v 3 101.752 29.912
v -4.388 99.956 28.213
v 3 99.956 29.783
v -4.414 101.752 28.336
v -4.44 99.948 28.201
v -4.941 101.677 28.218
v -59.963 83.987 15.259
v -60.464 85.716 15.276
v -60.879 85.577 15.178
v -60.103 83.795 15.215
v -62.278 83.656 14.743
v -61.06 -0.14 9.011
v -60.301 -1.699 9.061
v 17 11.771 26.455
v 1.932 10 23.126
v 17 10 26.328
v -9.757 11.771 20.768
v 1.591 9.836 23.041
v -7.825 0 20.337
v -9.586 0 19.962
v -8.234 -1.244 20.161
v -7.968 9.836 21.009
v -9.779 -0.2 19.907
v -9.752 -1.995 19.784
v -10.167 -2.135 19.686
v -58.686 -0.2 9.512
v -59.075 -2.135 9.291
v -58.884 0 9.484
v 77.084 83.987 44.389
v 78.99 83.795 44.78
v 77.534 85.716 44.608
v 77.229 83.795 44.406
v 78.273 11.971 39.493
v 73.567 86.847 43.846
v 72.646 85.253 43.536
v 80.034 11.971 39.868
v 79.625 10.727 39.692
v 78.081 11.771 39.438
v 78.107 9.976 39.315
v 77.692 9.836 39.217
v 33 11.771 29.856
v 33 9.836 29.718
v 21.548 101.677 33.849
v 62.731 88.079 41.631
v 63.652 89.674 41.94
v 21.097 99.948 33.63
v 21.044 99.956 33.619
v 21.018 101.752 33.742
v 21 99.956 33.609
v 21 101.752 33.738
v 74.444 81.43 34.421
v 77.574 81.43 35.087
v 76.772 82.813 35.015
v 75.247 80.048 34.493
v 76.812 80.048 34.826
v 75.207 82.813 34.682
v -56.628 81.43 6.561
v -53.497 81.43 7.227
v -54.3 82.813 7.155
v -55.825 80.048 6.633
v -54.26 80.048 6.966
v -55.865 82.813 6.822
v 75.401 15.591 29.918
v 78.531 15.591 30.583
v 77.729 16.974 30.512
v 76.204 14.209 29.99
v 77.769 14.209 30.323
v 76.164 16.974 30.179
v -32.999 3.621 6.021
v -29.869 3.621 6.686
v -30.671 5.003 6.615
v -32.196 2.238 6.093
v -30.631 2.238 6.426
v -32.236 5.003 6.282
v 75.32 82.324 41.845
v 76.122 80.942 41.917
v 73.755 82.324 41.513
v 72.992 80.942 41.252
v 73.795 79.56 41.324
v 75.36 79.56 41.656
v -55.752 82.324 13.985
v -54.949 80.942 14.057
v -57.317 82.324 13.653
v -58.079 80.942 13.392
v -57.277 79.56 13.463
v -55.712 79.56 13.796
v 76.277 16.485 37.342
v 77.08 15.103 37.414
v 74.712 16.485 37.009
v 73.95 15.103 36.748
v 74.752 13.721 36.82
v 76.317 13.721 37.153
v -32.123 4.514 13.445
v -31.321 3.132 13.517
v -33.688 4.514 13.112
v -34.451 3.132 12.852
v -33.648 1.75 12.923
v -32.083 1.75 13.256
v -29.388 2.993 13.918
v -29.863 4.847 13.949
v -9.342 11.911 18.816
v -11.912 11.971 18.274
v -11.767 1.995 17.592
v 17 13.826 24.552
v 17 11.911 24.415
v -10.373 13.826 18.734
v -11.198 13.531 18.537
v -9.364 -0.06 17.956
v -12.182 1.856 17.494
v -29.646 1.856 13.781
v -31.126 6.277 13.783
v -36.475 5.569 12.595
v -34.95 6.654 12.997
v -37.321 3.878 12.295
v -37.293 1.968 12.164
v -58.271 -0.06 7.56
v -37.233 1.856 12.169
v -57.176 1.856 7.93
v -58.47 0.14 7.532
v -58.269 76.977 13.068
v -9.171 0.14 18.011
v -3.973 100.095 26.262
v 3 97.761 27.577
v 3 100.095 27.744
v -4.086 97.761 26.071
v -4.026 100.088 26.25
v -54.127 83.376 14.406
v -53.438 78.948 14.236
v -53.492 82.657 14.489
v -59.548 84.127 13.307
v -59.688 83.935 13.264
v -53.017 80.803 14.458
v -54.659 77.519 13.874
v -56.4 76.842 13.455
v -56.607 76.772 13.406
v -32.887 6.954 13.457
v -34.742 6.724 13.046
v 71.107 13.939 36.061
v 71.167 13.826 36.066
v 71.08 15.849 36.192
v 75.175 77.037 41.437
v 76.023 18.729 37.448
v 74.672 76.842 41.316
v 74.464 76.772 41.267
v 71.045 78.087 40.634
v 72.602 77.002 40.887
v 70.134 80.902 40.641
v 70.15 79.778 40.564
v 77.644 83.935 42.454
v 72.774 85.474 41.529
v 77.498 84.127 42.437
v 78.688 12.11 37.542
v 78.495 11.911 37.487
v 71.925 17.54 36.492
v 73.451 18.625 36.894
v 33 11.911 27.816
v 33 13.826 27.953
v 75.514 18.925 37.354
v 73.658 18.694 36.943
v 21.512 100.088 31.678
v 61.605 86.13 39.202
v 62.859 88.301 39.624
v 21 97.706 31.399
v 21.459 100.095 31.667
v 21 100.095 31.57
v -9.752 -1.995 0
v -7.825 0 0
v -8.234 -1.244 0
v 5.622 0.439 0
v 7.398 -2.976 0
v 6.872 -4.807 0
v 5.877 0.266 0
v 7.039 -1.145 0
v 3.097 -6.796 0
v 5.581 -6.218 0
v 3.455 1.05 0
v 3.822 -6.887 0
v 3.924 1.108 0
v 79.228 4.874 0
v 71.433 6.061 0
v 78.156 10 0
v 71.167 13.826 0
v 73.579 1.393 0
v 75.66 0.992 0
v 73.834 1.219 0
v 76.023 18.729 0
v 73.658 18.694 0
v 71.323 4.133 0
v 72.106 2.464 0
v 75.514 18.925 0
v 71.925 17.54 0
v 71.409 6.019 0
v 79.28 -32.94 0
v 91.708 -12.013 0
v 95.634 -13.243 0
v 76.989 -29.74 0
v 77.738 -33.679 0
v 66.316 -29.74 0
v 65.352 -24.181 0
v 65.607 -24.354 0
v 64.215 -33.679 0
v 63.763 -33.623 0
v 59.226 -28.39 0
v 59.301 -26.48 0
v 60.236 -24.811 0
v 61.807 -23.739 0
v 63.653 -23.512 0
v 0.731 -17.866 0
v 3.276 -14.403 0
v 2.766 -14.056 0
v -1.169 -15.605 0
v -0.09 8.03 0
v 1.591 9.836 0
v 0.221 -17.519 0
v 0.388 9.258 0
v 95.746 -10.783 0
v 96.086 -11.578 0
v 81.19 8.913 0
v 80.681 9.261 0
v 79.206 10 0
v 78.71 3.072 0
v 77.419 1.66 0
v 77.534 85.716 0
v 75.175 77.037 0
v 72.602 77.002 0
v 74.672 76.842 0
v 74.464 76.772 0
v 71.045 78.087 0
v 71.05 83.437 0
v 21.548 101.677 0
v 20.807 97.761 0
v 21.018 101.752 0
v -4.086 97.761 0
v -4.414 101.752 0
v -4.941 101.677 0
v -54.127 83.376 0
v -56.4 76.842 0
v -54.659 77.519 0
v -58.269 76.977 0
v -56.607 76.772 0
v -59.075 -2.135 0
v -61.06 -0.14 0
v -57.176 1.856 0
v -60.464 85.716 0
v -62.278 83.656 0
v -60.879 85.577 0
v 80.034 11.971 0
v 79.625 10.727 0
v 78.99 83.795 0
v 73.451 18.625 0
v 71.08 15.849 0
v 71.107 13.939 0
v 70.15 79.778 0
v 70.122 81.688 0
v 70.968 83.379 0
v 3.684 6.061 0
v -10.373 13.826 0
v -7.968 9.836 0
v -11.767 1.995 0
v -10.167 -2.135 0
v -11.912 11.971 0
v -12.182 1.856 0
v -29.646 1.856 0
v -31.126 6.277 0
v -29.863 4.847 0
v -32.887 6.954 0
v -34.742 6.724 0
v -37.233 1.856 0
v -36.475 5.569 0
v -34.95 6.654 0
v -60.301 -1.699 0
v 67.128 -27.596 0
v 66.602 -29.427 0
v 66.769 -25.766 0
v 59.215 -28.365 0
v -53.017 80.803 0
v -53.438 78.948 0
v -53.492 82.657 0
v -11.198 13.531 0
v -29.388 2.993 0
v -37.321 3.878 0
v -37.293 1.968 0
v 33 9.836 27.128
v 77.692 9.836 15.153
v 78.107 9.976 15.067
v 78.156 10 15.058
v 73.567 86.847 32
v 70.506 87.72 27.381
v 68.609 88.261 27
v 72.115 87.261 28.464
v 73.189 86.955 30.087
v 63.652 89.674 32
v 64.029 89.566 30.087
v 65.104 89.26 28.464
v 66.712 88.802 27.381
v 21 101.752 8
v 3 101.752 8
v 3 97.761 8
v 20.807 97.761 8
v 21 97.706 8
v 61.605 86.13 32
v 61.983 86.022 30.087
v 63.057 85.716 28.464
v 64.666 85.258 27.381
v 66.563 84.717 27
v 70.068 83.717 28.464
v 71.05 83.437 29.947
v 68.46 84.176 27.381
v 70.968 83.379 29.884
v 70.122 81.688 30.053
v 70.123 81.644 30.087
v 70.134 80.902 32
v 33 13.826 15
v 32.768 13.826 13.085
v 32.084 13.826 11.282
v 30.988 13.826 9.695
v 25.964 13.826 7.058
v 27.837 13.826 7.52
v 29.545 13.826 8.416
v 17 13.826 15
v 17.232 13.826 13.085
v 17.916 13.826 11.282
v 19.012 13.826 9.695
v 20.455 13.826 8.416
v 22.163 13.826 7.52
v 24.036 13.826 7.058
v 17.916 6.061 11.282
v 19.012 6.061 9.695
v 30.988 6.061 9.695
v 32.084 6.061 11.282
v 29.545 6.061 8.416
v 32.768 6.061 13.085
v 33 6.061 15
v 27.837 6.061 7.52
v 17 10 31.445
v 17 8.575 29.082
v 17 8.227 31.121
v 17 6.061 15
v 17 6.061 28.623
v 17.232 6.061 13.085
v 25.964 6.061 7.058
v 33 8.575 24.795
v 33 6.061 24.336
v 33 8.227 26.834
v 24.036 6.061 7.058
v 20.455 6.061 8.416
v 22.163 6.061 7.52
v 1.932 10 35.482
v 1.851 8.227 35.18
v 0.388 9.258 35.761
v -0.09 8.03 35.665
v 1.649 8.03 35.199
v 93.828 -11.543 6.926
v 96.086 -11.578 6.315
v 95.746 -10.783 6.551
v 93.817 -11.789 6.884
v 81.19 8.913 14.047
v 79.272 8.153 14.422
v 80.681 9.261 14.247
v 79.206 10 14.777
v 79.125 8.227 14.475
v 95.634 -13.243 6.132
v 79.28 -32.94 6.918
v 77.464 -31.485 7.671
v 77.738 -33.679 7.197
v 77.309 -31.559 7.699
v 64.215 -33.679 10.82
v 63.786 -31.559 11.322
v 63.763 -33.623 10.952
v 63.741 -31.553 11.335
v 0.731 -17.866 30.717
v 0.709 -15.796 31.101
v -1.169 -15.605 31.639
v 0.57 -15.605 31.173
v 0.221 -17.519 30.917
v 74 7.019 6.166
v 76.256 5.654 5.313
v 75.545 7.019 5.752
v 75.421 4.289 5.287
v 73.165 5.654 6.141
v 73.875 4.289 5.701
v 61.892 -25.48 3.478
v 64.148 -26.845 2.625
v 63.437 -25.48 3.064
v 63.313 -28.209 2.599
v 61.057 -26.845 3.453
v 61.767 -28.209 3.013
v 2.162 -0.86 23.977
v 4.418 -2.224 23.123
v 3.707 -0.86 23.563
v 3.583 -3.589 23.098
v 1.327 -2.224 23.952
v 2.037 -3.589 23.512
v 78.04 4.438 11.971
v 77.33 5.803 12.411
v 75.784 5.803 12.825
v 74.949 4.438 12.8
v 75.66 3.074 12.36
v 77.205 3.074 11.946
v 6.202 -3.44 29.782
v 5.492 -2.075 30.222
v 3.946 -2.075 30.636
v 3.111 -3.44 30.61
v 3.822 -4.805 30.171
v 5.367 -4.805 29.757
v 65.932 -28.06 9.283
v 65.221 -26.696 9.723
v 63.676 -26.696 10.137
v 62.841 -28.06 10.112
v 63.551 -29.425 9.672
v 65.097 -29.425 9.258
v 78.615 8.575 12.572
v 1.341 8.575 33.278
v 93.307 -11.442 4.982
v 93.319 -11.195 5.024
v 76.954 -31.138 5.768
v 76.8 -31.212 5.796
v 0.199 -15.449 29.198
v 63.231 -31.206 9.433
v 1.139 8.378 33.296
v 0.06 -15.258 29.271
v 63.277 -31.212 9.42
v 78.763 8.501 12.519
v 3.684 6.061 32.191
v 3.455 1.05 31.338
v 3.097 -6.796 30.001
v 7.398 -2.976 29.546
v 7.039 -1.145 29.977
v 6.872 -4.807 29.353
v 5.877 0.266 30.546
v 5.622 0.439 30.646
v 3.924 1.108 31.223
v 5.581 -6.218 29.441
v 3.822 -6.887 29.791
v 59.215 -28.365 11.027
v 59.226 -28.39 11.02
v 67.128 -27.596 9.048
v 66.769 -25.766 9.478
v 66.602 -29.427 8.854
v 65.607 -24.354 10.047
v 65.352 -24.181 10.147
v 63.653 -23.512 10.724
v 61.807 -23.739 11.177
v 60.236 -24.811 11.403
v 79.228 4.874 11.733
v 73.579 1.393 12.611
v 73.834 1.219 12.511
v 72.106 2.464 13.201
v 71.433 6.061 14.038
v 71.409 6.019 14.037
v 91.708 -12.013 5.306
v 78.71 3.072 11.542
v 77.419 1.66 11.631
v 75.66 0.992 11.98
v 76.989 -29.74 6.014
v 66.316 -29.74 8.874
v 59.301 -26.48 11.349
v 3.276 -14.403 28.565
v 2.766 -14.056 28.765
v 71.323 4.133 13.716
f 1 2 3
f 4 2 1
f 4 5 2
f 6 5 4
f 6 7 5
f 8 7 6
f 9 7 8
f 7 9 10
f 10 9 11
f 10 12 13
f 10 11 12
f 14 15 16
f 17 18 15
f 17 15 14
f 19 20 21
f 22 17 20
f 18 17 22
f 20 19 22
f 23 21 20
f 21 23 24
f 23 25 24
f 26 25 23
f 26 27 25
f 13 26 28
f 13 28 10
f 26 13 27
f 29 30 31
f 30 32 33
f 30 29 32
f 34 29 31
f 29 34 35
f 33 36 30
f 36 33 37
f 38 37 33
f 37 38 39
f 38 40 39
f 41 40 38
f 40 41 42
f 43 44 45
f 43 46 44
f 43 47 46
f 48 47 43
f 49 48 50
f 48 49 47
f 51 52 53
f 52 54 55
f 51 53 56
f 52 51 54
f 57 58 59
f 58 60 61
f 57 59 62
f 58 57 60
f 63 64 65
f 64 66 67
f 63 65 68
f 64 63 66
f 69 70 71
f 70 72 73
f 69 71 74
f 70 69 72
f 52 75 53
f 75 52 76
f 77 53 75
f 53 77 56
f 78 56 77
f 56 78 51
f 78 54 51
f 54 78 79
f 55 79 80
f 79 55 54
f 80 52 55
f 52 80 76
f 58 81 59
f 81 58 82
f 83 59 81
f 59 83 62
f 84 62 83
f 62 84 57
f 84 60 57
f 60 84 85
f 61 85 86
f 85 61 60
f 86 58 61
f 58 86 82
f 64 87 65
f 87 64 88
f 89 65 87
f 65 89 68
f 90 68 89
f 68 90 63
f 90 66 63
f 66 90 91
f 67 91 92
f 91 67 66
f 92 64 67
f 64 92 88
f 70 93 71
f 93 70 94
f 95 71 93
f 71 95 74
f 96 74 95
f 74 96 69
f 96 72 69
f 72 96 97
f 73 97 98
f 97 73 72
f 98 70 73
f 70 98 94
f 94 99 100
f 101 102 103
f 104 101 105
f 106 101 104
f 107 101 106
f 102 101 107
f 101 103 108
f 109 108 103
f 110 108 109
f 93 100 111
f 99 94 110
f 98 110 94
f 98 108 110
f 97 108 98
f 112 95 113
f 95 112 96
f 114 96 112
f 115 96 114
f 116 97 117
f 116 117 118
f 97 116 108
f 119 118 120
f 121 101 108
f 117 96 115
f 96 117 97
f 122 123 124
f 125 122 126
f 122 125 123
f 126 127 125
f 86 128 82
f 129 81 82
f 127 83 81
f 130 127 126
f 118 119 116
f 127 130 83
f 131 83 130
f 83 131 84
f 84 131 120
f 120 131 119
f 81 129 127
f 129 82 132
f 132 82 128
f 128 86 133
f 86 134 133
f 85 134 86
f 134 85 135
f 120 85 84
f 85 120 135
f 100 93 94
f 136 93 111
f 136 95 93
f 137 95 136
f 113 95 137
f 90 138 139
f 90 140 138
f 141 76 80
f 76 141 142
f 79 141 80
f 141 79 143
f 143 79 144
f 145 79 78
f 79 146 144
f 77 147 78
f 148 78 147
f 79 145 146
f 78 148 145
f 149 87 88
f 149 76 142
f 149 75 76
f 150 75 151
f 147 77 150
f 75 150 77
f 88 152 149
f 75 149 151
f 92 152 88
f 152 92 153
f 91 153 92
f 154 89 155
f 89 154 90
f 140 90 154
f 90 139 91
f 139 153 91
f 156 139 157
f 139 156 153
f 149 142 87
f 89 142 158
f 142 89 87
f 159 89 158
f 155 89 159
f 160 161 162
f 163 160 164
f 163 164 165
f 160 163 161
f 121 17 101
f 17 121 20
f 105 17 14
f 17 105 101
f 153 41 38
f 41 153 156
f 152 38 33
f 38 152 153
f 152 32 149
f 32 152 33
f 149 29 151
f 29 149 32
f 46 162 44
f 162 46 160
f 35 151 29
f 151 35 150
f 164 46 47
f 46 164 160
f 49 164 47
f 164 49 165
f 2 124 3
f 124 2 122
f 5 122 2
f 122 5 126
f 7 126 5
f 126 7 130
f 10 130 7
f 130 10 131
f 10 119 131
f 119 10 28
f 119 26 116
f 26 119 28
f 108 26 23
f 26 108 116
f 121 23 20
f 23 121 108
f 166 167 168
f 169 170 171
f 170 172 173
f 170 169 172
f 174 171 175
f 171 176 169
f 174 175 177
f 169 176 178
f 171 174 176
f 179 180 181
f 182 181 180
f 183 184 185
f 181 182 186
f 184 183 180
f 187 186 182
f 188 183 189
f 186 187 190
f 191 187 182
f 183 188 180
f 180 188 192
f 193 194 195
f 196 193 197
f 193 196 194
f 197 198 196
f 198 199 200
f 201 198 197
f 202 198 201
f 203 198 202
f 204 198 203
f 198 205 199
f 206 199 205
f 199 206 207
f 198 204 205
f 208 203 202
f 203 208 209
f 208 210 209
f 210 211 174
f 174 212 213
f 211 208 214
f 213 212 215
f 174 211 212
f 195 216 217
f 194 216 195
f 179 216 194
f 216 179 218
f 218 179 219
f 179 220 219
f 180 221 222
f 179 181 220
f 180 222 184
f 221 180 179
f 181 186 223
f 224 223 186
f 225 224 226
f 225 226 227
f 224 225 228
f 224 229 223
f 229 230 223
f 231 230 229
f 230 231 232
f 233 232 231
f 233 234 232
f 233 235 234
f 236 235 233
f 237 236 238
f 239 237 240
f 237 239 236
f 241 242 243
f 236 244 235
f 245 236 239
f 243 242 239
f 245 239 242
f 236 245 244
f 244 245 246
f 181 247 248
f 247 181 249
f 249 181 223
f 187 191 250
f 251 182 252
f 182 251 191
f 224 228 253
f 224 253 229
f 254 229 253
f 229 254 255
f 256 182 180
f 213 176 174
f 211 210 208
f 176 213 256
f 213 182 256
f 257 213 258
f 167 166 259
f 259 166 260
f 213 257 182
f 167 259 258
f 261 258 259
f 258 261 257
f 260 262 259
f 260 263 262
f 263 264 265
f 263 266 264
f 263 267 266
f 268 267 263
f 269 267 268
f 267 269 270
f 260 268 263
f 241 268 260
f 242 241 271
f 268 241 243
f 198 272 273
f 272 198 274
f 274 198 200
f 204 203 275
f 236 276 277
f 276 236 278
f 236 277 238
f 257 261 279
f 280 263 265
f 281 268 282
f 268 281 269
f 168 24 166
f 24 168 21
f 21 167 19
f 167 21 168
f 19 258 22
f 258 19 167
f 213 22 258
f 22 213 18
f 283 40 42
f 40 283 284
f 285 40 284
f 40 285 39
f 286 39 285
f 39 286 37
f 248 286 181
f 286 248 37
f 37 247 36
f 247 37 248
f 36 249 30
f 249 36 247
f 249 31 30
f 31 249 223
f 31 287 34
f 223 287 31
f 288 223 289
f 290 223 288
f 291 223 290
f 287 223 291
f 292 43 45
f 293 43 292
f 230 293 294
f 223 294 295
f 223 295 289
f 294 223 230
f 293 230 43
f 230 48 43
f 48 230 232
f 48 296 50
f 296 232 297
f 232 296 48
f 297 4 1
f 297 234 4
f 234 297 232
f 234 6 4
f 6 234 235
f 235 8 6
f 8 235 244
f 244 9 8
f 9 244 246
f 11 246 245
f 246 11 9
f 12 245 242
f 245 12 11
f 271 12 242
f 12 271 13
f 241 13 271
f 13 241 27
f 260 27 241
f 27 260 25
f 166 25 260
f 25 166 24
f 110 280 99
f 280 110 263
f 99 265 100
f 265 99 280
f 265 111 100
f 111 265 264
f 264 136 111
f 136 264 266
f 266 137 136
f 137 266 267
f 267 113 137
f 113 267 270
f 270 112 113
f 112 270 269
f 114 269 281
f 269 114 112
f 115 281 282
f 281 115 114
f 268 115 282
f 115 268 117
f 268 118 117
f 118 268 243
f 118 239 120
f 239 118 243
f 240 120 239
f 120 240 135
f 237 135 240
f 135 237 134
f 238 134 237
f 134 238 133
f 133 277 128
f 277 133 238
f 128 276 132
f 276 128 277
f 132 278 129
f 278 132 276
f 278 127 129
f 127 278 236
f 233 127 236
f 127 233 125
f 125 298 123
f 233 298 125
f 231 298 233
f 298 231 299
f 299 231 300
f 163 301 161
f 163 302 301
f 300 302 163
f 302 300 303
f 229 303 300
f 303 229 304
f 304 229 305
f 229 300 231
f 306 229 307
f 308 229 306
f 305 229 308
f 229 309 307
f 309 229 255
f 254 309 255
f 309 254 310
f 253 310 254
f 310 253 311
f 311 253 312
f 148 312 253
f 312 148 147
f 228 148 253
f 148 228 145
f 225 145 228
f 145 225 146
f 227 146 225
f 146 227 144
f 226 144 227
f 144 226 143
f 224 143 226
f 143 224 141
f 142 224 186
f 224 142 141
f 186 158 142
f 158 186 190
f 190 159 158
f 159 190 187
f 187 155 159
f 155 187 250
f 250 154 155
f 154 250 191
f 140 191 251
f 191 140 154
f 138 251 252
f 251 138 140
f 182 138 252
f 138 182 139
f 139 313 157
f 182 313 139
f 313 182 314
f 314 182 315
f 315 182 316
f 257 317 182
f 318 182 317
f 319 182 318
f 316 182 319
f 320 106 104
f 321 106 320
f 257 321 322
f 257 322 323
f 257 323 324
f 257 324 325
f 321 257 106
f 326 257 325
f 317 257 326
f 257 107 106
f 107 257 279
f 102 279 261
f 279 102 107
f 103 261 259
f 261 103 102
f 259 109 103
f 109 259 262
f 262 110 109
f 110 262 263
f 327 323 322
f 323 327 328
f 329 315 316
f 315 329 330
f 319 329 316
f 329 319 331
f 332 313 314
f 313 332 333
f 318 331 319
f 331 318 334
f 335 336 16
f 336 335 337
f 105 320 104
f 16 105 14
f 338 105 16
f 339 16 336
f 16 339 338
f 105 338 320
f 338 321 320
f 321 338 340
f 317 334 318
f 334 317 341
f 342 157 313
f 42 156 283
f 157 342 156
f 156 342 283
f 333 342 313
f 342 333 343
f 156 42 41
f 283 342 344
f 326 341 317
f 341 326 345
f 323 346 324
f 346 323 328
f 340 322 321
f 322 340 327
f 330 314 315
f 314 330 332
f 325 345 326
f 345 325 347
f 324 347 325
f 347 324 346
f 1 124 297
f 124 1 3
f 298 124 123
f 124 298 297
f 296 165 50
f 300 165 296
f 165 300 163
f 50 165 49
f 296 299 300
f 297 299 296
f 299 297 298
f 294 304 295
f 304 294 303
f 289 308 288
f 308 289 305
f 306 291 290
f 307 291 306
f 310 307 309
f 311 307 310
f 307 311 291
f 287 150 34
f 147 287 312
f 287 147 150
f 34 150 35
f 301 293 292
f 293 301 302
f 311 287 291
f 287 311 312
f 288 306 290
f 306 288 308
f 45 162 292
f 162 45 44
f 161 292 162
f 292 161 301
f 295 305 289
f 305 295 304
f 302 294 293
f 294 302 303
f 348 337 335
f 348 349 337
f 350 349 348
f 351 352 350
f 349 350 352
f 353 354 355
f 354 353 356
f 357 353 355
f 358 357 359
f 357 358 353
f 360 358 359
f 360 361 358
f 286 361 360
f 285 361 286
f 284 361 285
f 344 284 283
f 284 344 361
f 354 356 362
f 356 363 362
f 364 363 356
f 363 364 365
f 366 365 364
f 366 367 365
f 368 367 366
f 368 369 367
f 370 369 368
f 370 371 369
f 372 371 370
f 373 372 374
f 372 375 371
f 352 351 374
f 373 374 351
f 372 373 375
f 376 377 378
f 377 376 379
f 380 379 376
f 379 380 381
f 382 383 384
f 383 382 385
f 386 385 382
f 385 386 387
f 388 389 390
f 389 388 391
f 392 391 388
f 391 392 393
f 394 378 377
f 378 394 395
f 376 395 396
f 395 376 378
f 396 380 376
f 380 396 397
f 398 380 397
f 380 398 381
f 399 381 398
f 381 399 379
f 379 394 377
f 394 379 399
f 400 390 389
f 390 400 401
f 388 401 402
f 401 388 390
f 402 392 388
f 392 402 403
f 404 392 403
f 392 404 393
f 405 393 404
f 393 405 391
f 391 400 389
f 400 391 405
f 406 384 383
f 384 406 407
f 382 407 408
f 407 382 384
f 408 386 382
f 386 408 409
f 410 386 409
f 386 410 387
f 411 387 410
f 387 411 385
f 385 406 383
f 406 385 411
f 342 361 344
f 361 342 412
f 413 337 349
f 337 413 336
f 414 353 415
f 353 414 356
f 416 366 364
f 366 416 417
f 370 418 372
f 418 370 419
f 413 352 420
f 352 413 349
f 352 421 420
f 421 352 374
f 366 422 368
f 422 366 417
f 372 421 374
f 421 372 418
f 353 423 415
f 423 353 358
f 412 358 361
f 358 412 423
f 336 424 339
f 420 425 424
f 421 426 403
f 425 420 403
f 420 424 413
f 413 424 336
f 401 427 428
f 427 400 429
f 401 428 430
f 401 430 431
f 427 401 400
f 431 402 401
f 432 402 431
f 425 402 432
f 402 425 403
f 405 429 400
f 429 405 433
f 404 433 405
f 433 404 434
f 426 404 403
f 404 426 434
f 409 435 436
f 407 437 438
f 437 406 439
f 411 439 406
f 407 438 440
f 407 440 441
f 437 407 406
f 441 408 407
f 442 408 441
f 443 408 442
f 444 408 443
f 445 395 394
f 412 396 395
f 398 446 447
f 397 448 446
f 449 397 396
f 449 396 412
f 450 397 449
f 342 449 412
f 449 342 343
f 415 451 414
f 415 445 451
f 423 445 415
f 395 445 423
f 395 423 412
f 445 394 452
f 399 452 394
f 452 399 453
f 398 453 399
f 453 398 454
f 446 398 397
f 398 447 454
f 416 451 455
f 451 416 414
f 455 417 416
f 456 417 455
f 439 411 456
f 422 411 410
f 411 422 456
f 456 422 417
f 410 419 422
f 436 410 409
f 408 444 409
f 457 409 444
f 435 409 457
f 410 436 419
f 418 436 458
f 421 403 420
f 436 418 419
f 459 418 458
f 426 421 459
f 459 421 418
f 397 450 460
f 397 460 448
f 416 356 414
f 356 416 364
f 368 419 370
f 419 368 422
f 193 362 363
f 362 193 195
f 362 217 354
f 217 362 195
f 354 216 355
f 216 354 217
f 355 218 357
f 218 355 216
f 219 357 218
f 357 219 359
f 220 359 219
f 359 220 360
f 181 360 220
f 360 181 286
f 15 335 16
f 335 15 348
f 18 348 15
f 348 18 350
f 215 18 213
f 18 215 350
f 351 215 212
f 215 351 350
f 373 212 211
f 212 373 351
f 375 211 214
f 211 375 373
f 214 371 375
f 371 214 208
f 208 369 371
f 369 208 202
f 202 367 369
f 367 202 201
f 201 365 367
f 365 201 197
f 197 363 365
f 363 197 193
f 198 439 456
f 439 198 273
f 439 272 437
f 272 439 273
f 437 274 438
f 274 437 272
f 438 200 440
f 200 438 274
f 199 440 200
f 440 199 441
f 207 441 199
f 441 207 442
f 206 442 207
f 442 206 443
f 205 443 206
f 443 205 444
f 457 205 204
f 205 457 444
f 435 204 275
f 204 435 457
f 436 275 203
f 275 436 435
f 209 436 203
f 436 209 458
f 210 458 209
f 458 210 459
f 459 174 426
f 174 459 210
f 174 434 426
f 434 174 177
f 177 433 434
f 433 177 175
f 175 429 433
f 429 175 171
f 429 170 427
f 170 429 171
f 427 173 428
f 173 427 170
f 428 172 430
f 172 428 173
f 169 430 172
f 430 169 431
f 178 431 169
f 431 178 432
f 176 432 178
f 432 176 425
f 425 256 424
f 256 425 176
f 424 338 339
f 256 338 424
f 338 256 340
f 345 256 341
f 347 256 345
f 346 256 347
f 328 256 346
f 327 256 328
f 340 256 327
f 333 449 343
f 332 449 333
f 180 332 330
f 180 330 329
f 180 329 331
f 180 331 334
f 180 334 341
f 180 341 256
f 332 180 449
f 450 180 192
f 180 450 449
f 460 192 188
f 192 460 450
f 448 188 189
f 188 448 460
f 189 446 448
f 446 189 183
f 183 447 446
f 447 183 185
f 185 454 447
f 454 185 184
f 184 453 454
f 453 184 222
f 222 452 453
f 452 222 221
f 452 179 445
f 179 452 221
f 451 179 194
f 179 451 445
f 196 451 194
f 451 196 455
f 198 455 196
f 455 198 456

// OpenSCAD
// file: common.scad
cls = 0.20;

module keyswitch_hole(x=0, y=0, a=0) {
    translate([x, y, 0]) {
        rotate([0, 0, 90+a]) {
            linear_extrude(height = 2) {
            square([14+cls, 14+cls], center = true);
            }
            linear_extrude(height = 0.6) {
                translate([-3, 7]) square([6, 1]);
            translate([-3, -8]) square([6, 1]);
            }
        }
    }
}

keyswitch_hole();

module joint_male_face() {
    translate([-1, 0])
    square([2,4]);
    translate([-3, 2])
    square([6,2]);
}

module joint_male(pos=[0,0]) {
    translate(pos){
      rotate([0,0,180]){
        linear_extrude(height=10)
        joint_male_face();
        
        translate([0,2,10])
        rotate([-90,0,0])
        linear_extrude(height=2)
        circle(3, $fn=12);
        
        translate([0,0,10])
        rotate([-90,0,0])
        linear_extrude(height=2)
        circle(1, $fn=12);
      }
    }
}

module joint_female(pos=[0,0]) {
    delta = 0.6;
    translate(pos){
      rotate([0,0,180]){
        linear_extrude(height=10)
        offset(delta=delta)
        joint_male_face();
        
        translate([0,1.6,10])
        rotate([-90,0,0])
        linear_extrude(height=2.8)
        offset(delta=delta)
        circle(3, $fn=12);

        translate([0,-0.4,10])
        rotate([-90,0,0])
        linear_extrude(height=2.8)
        offset(delta=delta)
        circle(1, $fn=12);
      }
    }
}


joint_male([20, 0]);
joint_female([30, 0]);
// file: thumb.scad
use <common.scad>;

thumb_plate_points = [
                [2,  -26],
                [2,  -2],
                [82, -2],
                [98,-22],
                [82, -42],
                [68, -42],
                ];

thumb_plate_sc_points = [
                [2+4, -14],
                [82-2, -2-4],
                [71-2, -42+3],
                ];

module plate_nohole() {
    linear_extrude(height=2)
    polygon(points=thumb_plate_points);
}

module keyswitch_col(x=0,y=0,c=3,a=0) {
    translate([x,y])
    rotate([0,0,a])
    for (i = [0:c-1]) {
        keyswitch_hole(0, 19*i);
    }
}

module plate_holes() {
    keyswitch_hole(20, -14-3, 90);
    keyswitch_hole(39, -14, 90);
    keyswitch_hole(60, -16, 90-20);
    keyswitch_hole(78, -27, 90-40);

    for(p=thumb_plate_sc_points) {
        linear_extrude(height=5)
            translate(p)
            circle(1.6);
    }
}


module thumb_plate() {
    difference() {
        plate_nohole();
        plate_holes();
    }
}


tilt_angle = [10,15,0];
tilt_angle_r = tilt_angle * -1;
height = 36;

module thumb_case_outer_face() {
    projection()
        translate([0,0,height])
        rotate(tilt_angle)
        linear_extrude(height=2)
        offset(2)
        polygon(points=thumb_plate_points);
}

module thumb_case_inner_face() {
    projection()
        translate([0,0,height])
        rotate(tilt_angle)
        linear_extrude(height=2)
        offset(-2)
        polygon(points=thumb_plate_points);
}

module thumb_case_bottom_face() {
    difference(){
        thumb_case_outer_face();
        thumb_case_inner_face();
    }
    projection()
    translate([0,0,height])
    rotate(tilt_angle)
    for(p=thumb_plate_sc_points){
        linear_extrude(height=1)
        translate([-2,1])
        translate(p)
        circle(4);
    }
}

module case() {
    difference() {
        linear_extrude(height=50)
            thumb_case_bottom_face();
        translate([0,0,height])
            rotate(tilt_angle){
            linear_extrude(height=50)
                square(300, center=true);
            // screw hole
            translate([0,0,-9])
                linear_extrude(height=9)
                for(p=thumb_plate_sc_points){
                    translate(p)
                        circle(1.6);
                }
            // plate hole
            translate([0,0,-2])
            linear_extrude(height=2)
            offset(0.2)
            polygon(points=thumb_plate_points);
        }
    }
}

module thumb_case_hole(joint=true) {
    // cable hole
    translate([25,0,0])
    rotate([90,0,0])
    linear_extrude(height=4){
        translate([0, 15])
        circle(8);
        translate([-8,15])
        square([16, 30]);
    }
    if (joint) {
        for (x = [10,60]) {
            joint_female([x, 0]);
        }
    }
}

module thumb_case(joint=true) {
    difference() {
        case();
        thumb_case_hole(joint=joint);
    }
}

thumb_case();

translate([0, 60])
thumb_plate();
// file: main.scad
use <common.scad>;

UNIT = 19;
UNIT_H = UNIT / 2;
UNIT_Q = UNIT / 4;
UNIT_E = UNIT / 8;

KEY_OFFSET_X = 10;
KEY_OFFSET_Y = 8;

finger_plate_points = [
    [-60,0],
    [-10,0],
    [-10,12],
    [80, 12],
    [80, 84],
    [23, 100],
    [-3, 100],
    [-60, 84],
];

finger_plate_sc_points = [
    [-34, 3],
    [80-3, 12+3],
    [80-3, 84 - 3],
    [-60+3, 84 - 3],
];

module finger_plate_nohole() {
    linear_extrude(height = 2)
    polygon(points=finger_plate_points);
}

module keyswitch_col(x=0,y=0,c=3,a=0) {
    rotate([0, 0, a])
    for (i = [0:c-1]) {
        keyswitch_hole(x, y+19*i);
    }
}

module finger_plate_holes() {
    // G
    GX = KEY_OFFSET_X - UNIT * 3;
    GY = KEY_OFFSET_Y + UNIT_Q;
    echo("G: ", GX, GY);
    keyswitch_col(GX, GY, 4);
    // F
    FX = KEY_OFFSET_X- UNIT * 2;
    FY = KEY_OFFSET_Y + UNIT_H;
    echo("F: ", FX, FY);
    keyswitch_col(FX, FY, 4);
    // E
    EX = KEY_OFFSET_X - UNIT;
    EY = KEY_OFFSET_Y + UNIT_H + UNIT_Q + UNIT_Q;
    echo("E: ", EX, EY);
    keyswitch_col(EX, EY, 4);
    // D
    DX = KEY_OFFSET_X;
    DY = KEY_OFFSET_Y + UNIT + UNIT_Q;
    echo("D: ", DX, DY);
    keyswitch_col(DX, DY, 4);
    // C
    CX = KEY_OFFSET_X+ UNIT;
    CY = KEY_OFFSET_Y + UNIT;
    echo("C: ", CX, CY);
    keyswitch_col(CX, CY, 4);
    // B
    BX = KEY_OFFSET_X+UNIT * 2;
    BY = KEY_OFFSET_Y+ UNIT_H + UNIT_Q;
    echo("B: ", BX, BY);
    keyswitch_col(BX, BY, 4);
    // A
    AX = KEY_OFFSET_X+UNIT*3;
    AY = KEY_OFFSET_Y+UNIT + UNIT_Q;
    echo("A: ", AX, AY);
    keyswitch_col(AX, AY, 1);
    // next plan?
    //keyswitch_col(AX, AY, 2);
    echo("A2: ", AX, AY + UNIT + UNIT_Q);
    keyswitch_col(AX, AY + UNIT + UNIT_Q, 1);
    for(p=finger_plate_sc_points){
        linear_extrude(height=5)
            translate(p)
            circle(1.6);
    }
}

module finger_plate() {
    difference() {
        finger_plate_nohole();
        finger_plate_holes();
    }
}

tilt_angle = [4,-12,0];
tilt_angle_r = tilt_angle * -1;
echo(tilt_angle_r);

//height = 15;
height = 22;

module finger_case_outer_face() {
    projection()
        translate([0,0,height])
        rotate(tilt_angle)
        linear_extrude(height=2)
        offset(2)
        polygon(points=finger_plate_points);
}

module finger_case_inner_face() {
    projection()
        translate([0,0,height])
        rotate(tilt_angle)
        linear_extrude(height=2)
        offset(-2)
        polygon(points=finger_plate_points);
}

module finger_case_bottom_face() {
    difference() {
        finger_case_outer_face();
        finger_case_inner_face();
    }
    projection()
    translate([0,0,height])
    rotate(tilt_angle)
    for(p=finger_plate_sc_points){
        linear_extrude(height=1)
        translate(p)
        circle(4);
    }
}


module finger_case_nohole() {
    difference() {
        linear_extrude(height=50)
        finger_case_bottom_face();
    
        translate([0,0,height])
        rotate(tilt_angle){
            linear_extrude(height=50)
            square(300, center=true);
            // sc hole
            translate([0,0,-9])
            linear_extrude(height=9)
            for(p=finger_plate_sc_points){
                translate(p)
                circle(1.6);
            }
            // plate_hole
            translate([0,0,-2])
            linear_extrude(height=2)
            offset(0.2)
            polygon(points=finger_plate_points);
        }
    }
}

module finger_case_hole() {
    // cable hole
    translate([25,15,0])
    rotate([90,0,0])
    linear_extrude(height=20){
        translate([0, 15])
        circle(8);
        translate([-8,15])
        square([16, 30]);
    }
    // USB hole
    translate([12,110,0])
    rotate([90,0,0])
    linear_extrude(height=20) {
        //translate([0, 10])
        //circle(9);
        translate([-9, 8])
        square([18, 40]);
    }
    // TRRS hole
    translate([72.5,95,0])
    rotate([90,0,-30])
    linear_extrude(height=20) {
        translate([0, 32])
        circle(5);
        translate([-5, 32])
        square([10, 30]);
    }
}

module finger_case(joint=true) {
    difference() {
        finger_case_nohole();
        finger_case_hole();
    }
    if (joint) {
        for (x = [10, 60]) {
            joint_male([x, 10]);
        }
    }
}

finger_case();


translate([0,-110])
finger_plate();
// main file
use <main.scad>;
use <thumb.scad>;

finger_case(joint=false);
translate([0,10])
thumb_case(joint=false);
